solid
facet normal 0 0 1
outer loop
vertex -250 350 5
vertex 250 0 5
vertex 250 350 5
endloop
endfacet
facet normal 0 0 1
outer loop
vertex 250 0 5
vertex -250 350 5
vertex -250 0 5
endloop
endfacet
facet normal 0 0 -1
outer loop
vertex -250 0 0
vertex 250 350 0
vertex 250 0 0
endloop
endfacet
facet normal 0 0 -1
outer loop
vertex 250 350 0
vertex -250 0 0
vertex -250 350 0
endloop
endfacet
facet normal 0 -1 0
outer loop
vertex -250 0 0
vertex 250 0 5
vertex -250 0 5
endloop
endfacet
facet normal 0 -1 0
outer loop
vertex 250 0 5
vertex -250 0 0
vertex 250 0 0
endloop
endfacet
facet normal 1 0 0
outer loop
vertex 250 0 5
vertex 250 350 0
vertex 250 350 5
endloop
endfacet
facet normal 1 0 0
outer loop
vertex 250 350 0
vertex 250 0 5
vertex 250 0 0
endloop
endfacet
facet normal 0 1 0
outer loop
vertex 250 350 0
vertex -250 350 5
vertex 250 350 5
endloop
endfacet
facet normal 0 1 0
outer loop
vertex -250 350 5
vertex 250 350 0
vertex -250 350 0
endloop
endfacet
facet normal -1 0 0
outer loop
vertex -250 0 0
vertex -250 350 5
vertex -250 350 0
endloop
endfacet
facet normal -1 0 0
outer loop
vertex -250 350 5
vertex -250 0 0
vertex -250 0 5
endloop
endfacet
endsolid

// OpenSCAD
//constants
kerf = 5;
width = 220;
height = 140;
depth = 325;
rows = 2;
cols = 4;
hmax = 500;
wmax = 500;
dmax = 350;
tab = 20;


//shelf
translate( [-wmax/2,0,0]){
	cube([wmax,dmax,kerf],0);
}
